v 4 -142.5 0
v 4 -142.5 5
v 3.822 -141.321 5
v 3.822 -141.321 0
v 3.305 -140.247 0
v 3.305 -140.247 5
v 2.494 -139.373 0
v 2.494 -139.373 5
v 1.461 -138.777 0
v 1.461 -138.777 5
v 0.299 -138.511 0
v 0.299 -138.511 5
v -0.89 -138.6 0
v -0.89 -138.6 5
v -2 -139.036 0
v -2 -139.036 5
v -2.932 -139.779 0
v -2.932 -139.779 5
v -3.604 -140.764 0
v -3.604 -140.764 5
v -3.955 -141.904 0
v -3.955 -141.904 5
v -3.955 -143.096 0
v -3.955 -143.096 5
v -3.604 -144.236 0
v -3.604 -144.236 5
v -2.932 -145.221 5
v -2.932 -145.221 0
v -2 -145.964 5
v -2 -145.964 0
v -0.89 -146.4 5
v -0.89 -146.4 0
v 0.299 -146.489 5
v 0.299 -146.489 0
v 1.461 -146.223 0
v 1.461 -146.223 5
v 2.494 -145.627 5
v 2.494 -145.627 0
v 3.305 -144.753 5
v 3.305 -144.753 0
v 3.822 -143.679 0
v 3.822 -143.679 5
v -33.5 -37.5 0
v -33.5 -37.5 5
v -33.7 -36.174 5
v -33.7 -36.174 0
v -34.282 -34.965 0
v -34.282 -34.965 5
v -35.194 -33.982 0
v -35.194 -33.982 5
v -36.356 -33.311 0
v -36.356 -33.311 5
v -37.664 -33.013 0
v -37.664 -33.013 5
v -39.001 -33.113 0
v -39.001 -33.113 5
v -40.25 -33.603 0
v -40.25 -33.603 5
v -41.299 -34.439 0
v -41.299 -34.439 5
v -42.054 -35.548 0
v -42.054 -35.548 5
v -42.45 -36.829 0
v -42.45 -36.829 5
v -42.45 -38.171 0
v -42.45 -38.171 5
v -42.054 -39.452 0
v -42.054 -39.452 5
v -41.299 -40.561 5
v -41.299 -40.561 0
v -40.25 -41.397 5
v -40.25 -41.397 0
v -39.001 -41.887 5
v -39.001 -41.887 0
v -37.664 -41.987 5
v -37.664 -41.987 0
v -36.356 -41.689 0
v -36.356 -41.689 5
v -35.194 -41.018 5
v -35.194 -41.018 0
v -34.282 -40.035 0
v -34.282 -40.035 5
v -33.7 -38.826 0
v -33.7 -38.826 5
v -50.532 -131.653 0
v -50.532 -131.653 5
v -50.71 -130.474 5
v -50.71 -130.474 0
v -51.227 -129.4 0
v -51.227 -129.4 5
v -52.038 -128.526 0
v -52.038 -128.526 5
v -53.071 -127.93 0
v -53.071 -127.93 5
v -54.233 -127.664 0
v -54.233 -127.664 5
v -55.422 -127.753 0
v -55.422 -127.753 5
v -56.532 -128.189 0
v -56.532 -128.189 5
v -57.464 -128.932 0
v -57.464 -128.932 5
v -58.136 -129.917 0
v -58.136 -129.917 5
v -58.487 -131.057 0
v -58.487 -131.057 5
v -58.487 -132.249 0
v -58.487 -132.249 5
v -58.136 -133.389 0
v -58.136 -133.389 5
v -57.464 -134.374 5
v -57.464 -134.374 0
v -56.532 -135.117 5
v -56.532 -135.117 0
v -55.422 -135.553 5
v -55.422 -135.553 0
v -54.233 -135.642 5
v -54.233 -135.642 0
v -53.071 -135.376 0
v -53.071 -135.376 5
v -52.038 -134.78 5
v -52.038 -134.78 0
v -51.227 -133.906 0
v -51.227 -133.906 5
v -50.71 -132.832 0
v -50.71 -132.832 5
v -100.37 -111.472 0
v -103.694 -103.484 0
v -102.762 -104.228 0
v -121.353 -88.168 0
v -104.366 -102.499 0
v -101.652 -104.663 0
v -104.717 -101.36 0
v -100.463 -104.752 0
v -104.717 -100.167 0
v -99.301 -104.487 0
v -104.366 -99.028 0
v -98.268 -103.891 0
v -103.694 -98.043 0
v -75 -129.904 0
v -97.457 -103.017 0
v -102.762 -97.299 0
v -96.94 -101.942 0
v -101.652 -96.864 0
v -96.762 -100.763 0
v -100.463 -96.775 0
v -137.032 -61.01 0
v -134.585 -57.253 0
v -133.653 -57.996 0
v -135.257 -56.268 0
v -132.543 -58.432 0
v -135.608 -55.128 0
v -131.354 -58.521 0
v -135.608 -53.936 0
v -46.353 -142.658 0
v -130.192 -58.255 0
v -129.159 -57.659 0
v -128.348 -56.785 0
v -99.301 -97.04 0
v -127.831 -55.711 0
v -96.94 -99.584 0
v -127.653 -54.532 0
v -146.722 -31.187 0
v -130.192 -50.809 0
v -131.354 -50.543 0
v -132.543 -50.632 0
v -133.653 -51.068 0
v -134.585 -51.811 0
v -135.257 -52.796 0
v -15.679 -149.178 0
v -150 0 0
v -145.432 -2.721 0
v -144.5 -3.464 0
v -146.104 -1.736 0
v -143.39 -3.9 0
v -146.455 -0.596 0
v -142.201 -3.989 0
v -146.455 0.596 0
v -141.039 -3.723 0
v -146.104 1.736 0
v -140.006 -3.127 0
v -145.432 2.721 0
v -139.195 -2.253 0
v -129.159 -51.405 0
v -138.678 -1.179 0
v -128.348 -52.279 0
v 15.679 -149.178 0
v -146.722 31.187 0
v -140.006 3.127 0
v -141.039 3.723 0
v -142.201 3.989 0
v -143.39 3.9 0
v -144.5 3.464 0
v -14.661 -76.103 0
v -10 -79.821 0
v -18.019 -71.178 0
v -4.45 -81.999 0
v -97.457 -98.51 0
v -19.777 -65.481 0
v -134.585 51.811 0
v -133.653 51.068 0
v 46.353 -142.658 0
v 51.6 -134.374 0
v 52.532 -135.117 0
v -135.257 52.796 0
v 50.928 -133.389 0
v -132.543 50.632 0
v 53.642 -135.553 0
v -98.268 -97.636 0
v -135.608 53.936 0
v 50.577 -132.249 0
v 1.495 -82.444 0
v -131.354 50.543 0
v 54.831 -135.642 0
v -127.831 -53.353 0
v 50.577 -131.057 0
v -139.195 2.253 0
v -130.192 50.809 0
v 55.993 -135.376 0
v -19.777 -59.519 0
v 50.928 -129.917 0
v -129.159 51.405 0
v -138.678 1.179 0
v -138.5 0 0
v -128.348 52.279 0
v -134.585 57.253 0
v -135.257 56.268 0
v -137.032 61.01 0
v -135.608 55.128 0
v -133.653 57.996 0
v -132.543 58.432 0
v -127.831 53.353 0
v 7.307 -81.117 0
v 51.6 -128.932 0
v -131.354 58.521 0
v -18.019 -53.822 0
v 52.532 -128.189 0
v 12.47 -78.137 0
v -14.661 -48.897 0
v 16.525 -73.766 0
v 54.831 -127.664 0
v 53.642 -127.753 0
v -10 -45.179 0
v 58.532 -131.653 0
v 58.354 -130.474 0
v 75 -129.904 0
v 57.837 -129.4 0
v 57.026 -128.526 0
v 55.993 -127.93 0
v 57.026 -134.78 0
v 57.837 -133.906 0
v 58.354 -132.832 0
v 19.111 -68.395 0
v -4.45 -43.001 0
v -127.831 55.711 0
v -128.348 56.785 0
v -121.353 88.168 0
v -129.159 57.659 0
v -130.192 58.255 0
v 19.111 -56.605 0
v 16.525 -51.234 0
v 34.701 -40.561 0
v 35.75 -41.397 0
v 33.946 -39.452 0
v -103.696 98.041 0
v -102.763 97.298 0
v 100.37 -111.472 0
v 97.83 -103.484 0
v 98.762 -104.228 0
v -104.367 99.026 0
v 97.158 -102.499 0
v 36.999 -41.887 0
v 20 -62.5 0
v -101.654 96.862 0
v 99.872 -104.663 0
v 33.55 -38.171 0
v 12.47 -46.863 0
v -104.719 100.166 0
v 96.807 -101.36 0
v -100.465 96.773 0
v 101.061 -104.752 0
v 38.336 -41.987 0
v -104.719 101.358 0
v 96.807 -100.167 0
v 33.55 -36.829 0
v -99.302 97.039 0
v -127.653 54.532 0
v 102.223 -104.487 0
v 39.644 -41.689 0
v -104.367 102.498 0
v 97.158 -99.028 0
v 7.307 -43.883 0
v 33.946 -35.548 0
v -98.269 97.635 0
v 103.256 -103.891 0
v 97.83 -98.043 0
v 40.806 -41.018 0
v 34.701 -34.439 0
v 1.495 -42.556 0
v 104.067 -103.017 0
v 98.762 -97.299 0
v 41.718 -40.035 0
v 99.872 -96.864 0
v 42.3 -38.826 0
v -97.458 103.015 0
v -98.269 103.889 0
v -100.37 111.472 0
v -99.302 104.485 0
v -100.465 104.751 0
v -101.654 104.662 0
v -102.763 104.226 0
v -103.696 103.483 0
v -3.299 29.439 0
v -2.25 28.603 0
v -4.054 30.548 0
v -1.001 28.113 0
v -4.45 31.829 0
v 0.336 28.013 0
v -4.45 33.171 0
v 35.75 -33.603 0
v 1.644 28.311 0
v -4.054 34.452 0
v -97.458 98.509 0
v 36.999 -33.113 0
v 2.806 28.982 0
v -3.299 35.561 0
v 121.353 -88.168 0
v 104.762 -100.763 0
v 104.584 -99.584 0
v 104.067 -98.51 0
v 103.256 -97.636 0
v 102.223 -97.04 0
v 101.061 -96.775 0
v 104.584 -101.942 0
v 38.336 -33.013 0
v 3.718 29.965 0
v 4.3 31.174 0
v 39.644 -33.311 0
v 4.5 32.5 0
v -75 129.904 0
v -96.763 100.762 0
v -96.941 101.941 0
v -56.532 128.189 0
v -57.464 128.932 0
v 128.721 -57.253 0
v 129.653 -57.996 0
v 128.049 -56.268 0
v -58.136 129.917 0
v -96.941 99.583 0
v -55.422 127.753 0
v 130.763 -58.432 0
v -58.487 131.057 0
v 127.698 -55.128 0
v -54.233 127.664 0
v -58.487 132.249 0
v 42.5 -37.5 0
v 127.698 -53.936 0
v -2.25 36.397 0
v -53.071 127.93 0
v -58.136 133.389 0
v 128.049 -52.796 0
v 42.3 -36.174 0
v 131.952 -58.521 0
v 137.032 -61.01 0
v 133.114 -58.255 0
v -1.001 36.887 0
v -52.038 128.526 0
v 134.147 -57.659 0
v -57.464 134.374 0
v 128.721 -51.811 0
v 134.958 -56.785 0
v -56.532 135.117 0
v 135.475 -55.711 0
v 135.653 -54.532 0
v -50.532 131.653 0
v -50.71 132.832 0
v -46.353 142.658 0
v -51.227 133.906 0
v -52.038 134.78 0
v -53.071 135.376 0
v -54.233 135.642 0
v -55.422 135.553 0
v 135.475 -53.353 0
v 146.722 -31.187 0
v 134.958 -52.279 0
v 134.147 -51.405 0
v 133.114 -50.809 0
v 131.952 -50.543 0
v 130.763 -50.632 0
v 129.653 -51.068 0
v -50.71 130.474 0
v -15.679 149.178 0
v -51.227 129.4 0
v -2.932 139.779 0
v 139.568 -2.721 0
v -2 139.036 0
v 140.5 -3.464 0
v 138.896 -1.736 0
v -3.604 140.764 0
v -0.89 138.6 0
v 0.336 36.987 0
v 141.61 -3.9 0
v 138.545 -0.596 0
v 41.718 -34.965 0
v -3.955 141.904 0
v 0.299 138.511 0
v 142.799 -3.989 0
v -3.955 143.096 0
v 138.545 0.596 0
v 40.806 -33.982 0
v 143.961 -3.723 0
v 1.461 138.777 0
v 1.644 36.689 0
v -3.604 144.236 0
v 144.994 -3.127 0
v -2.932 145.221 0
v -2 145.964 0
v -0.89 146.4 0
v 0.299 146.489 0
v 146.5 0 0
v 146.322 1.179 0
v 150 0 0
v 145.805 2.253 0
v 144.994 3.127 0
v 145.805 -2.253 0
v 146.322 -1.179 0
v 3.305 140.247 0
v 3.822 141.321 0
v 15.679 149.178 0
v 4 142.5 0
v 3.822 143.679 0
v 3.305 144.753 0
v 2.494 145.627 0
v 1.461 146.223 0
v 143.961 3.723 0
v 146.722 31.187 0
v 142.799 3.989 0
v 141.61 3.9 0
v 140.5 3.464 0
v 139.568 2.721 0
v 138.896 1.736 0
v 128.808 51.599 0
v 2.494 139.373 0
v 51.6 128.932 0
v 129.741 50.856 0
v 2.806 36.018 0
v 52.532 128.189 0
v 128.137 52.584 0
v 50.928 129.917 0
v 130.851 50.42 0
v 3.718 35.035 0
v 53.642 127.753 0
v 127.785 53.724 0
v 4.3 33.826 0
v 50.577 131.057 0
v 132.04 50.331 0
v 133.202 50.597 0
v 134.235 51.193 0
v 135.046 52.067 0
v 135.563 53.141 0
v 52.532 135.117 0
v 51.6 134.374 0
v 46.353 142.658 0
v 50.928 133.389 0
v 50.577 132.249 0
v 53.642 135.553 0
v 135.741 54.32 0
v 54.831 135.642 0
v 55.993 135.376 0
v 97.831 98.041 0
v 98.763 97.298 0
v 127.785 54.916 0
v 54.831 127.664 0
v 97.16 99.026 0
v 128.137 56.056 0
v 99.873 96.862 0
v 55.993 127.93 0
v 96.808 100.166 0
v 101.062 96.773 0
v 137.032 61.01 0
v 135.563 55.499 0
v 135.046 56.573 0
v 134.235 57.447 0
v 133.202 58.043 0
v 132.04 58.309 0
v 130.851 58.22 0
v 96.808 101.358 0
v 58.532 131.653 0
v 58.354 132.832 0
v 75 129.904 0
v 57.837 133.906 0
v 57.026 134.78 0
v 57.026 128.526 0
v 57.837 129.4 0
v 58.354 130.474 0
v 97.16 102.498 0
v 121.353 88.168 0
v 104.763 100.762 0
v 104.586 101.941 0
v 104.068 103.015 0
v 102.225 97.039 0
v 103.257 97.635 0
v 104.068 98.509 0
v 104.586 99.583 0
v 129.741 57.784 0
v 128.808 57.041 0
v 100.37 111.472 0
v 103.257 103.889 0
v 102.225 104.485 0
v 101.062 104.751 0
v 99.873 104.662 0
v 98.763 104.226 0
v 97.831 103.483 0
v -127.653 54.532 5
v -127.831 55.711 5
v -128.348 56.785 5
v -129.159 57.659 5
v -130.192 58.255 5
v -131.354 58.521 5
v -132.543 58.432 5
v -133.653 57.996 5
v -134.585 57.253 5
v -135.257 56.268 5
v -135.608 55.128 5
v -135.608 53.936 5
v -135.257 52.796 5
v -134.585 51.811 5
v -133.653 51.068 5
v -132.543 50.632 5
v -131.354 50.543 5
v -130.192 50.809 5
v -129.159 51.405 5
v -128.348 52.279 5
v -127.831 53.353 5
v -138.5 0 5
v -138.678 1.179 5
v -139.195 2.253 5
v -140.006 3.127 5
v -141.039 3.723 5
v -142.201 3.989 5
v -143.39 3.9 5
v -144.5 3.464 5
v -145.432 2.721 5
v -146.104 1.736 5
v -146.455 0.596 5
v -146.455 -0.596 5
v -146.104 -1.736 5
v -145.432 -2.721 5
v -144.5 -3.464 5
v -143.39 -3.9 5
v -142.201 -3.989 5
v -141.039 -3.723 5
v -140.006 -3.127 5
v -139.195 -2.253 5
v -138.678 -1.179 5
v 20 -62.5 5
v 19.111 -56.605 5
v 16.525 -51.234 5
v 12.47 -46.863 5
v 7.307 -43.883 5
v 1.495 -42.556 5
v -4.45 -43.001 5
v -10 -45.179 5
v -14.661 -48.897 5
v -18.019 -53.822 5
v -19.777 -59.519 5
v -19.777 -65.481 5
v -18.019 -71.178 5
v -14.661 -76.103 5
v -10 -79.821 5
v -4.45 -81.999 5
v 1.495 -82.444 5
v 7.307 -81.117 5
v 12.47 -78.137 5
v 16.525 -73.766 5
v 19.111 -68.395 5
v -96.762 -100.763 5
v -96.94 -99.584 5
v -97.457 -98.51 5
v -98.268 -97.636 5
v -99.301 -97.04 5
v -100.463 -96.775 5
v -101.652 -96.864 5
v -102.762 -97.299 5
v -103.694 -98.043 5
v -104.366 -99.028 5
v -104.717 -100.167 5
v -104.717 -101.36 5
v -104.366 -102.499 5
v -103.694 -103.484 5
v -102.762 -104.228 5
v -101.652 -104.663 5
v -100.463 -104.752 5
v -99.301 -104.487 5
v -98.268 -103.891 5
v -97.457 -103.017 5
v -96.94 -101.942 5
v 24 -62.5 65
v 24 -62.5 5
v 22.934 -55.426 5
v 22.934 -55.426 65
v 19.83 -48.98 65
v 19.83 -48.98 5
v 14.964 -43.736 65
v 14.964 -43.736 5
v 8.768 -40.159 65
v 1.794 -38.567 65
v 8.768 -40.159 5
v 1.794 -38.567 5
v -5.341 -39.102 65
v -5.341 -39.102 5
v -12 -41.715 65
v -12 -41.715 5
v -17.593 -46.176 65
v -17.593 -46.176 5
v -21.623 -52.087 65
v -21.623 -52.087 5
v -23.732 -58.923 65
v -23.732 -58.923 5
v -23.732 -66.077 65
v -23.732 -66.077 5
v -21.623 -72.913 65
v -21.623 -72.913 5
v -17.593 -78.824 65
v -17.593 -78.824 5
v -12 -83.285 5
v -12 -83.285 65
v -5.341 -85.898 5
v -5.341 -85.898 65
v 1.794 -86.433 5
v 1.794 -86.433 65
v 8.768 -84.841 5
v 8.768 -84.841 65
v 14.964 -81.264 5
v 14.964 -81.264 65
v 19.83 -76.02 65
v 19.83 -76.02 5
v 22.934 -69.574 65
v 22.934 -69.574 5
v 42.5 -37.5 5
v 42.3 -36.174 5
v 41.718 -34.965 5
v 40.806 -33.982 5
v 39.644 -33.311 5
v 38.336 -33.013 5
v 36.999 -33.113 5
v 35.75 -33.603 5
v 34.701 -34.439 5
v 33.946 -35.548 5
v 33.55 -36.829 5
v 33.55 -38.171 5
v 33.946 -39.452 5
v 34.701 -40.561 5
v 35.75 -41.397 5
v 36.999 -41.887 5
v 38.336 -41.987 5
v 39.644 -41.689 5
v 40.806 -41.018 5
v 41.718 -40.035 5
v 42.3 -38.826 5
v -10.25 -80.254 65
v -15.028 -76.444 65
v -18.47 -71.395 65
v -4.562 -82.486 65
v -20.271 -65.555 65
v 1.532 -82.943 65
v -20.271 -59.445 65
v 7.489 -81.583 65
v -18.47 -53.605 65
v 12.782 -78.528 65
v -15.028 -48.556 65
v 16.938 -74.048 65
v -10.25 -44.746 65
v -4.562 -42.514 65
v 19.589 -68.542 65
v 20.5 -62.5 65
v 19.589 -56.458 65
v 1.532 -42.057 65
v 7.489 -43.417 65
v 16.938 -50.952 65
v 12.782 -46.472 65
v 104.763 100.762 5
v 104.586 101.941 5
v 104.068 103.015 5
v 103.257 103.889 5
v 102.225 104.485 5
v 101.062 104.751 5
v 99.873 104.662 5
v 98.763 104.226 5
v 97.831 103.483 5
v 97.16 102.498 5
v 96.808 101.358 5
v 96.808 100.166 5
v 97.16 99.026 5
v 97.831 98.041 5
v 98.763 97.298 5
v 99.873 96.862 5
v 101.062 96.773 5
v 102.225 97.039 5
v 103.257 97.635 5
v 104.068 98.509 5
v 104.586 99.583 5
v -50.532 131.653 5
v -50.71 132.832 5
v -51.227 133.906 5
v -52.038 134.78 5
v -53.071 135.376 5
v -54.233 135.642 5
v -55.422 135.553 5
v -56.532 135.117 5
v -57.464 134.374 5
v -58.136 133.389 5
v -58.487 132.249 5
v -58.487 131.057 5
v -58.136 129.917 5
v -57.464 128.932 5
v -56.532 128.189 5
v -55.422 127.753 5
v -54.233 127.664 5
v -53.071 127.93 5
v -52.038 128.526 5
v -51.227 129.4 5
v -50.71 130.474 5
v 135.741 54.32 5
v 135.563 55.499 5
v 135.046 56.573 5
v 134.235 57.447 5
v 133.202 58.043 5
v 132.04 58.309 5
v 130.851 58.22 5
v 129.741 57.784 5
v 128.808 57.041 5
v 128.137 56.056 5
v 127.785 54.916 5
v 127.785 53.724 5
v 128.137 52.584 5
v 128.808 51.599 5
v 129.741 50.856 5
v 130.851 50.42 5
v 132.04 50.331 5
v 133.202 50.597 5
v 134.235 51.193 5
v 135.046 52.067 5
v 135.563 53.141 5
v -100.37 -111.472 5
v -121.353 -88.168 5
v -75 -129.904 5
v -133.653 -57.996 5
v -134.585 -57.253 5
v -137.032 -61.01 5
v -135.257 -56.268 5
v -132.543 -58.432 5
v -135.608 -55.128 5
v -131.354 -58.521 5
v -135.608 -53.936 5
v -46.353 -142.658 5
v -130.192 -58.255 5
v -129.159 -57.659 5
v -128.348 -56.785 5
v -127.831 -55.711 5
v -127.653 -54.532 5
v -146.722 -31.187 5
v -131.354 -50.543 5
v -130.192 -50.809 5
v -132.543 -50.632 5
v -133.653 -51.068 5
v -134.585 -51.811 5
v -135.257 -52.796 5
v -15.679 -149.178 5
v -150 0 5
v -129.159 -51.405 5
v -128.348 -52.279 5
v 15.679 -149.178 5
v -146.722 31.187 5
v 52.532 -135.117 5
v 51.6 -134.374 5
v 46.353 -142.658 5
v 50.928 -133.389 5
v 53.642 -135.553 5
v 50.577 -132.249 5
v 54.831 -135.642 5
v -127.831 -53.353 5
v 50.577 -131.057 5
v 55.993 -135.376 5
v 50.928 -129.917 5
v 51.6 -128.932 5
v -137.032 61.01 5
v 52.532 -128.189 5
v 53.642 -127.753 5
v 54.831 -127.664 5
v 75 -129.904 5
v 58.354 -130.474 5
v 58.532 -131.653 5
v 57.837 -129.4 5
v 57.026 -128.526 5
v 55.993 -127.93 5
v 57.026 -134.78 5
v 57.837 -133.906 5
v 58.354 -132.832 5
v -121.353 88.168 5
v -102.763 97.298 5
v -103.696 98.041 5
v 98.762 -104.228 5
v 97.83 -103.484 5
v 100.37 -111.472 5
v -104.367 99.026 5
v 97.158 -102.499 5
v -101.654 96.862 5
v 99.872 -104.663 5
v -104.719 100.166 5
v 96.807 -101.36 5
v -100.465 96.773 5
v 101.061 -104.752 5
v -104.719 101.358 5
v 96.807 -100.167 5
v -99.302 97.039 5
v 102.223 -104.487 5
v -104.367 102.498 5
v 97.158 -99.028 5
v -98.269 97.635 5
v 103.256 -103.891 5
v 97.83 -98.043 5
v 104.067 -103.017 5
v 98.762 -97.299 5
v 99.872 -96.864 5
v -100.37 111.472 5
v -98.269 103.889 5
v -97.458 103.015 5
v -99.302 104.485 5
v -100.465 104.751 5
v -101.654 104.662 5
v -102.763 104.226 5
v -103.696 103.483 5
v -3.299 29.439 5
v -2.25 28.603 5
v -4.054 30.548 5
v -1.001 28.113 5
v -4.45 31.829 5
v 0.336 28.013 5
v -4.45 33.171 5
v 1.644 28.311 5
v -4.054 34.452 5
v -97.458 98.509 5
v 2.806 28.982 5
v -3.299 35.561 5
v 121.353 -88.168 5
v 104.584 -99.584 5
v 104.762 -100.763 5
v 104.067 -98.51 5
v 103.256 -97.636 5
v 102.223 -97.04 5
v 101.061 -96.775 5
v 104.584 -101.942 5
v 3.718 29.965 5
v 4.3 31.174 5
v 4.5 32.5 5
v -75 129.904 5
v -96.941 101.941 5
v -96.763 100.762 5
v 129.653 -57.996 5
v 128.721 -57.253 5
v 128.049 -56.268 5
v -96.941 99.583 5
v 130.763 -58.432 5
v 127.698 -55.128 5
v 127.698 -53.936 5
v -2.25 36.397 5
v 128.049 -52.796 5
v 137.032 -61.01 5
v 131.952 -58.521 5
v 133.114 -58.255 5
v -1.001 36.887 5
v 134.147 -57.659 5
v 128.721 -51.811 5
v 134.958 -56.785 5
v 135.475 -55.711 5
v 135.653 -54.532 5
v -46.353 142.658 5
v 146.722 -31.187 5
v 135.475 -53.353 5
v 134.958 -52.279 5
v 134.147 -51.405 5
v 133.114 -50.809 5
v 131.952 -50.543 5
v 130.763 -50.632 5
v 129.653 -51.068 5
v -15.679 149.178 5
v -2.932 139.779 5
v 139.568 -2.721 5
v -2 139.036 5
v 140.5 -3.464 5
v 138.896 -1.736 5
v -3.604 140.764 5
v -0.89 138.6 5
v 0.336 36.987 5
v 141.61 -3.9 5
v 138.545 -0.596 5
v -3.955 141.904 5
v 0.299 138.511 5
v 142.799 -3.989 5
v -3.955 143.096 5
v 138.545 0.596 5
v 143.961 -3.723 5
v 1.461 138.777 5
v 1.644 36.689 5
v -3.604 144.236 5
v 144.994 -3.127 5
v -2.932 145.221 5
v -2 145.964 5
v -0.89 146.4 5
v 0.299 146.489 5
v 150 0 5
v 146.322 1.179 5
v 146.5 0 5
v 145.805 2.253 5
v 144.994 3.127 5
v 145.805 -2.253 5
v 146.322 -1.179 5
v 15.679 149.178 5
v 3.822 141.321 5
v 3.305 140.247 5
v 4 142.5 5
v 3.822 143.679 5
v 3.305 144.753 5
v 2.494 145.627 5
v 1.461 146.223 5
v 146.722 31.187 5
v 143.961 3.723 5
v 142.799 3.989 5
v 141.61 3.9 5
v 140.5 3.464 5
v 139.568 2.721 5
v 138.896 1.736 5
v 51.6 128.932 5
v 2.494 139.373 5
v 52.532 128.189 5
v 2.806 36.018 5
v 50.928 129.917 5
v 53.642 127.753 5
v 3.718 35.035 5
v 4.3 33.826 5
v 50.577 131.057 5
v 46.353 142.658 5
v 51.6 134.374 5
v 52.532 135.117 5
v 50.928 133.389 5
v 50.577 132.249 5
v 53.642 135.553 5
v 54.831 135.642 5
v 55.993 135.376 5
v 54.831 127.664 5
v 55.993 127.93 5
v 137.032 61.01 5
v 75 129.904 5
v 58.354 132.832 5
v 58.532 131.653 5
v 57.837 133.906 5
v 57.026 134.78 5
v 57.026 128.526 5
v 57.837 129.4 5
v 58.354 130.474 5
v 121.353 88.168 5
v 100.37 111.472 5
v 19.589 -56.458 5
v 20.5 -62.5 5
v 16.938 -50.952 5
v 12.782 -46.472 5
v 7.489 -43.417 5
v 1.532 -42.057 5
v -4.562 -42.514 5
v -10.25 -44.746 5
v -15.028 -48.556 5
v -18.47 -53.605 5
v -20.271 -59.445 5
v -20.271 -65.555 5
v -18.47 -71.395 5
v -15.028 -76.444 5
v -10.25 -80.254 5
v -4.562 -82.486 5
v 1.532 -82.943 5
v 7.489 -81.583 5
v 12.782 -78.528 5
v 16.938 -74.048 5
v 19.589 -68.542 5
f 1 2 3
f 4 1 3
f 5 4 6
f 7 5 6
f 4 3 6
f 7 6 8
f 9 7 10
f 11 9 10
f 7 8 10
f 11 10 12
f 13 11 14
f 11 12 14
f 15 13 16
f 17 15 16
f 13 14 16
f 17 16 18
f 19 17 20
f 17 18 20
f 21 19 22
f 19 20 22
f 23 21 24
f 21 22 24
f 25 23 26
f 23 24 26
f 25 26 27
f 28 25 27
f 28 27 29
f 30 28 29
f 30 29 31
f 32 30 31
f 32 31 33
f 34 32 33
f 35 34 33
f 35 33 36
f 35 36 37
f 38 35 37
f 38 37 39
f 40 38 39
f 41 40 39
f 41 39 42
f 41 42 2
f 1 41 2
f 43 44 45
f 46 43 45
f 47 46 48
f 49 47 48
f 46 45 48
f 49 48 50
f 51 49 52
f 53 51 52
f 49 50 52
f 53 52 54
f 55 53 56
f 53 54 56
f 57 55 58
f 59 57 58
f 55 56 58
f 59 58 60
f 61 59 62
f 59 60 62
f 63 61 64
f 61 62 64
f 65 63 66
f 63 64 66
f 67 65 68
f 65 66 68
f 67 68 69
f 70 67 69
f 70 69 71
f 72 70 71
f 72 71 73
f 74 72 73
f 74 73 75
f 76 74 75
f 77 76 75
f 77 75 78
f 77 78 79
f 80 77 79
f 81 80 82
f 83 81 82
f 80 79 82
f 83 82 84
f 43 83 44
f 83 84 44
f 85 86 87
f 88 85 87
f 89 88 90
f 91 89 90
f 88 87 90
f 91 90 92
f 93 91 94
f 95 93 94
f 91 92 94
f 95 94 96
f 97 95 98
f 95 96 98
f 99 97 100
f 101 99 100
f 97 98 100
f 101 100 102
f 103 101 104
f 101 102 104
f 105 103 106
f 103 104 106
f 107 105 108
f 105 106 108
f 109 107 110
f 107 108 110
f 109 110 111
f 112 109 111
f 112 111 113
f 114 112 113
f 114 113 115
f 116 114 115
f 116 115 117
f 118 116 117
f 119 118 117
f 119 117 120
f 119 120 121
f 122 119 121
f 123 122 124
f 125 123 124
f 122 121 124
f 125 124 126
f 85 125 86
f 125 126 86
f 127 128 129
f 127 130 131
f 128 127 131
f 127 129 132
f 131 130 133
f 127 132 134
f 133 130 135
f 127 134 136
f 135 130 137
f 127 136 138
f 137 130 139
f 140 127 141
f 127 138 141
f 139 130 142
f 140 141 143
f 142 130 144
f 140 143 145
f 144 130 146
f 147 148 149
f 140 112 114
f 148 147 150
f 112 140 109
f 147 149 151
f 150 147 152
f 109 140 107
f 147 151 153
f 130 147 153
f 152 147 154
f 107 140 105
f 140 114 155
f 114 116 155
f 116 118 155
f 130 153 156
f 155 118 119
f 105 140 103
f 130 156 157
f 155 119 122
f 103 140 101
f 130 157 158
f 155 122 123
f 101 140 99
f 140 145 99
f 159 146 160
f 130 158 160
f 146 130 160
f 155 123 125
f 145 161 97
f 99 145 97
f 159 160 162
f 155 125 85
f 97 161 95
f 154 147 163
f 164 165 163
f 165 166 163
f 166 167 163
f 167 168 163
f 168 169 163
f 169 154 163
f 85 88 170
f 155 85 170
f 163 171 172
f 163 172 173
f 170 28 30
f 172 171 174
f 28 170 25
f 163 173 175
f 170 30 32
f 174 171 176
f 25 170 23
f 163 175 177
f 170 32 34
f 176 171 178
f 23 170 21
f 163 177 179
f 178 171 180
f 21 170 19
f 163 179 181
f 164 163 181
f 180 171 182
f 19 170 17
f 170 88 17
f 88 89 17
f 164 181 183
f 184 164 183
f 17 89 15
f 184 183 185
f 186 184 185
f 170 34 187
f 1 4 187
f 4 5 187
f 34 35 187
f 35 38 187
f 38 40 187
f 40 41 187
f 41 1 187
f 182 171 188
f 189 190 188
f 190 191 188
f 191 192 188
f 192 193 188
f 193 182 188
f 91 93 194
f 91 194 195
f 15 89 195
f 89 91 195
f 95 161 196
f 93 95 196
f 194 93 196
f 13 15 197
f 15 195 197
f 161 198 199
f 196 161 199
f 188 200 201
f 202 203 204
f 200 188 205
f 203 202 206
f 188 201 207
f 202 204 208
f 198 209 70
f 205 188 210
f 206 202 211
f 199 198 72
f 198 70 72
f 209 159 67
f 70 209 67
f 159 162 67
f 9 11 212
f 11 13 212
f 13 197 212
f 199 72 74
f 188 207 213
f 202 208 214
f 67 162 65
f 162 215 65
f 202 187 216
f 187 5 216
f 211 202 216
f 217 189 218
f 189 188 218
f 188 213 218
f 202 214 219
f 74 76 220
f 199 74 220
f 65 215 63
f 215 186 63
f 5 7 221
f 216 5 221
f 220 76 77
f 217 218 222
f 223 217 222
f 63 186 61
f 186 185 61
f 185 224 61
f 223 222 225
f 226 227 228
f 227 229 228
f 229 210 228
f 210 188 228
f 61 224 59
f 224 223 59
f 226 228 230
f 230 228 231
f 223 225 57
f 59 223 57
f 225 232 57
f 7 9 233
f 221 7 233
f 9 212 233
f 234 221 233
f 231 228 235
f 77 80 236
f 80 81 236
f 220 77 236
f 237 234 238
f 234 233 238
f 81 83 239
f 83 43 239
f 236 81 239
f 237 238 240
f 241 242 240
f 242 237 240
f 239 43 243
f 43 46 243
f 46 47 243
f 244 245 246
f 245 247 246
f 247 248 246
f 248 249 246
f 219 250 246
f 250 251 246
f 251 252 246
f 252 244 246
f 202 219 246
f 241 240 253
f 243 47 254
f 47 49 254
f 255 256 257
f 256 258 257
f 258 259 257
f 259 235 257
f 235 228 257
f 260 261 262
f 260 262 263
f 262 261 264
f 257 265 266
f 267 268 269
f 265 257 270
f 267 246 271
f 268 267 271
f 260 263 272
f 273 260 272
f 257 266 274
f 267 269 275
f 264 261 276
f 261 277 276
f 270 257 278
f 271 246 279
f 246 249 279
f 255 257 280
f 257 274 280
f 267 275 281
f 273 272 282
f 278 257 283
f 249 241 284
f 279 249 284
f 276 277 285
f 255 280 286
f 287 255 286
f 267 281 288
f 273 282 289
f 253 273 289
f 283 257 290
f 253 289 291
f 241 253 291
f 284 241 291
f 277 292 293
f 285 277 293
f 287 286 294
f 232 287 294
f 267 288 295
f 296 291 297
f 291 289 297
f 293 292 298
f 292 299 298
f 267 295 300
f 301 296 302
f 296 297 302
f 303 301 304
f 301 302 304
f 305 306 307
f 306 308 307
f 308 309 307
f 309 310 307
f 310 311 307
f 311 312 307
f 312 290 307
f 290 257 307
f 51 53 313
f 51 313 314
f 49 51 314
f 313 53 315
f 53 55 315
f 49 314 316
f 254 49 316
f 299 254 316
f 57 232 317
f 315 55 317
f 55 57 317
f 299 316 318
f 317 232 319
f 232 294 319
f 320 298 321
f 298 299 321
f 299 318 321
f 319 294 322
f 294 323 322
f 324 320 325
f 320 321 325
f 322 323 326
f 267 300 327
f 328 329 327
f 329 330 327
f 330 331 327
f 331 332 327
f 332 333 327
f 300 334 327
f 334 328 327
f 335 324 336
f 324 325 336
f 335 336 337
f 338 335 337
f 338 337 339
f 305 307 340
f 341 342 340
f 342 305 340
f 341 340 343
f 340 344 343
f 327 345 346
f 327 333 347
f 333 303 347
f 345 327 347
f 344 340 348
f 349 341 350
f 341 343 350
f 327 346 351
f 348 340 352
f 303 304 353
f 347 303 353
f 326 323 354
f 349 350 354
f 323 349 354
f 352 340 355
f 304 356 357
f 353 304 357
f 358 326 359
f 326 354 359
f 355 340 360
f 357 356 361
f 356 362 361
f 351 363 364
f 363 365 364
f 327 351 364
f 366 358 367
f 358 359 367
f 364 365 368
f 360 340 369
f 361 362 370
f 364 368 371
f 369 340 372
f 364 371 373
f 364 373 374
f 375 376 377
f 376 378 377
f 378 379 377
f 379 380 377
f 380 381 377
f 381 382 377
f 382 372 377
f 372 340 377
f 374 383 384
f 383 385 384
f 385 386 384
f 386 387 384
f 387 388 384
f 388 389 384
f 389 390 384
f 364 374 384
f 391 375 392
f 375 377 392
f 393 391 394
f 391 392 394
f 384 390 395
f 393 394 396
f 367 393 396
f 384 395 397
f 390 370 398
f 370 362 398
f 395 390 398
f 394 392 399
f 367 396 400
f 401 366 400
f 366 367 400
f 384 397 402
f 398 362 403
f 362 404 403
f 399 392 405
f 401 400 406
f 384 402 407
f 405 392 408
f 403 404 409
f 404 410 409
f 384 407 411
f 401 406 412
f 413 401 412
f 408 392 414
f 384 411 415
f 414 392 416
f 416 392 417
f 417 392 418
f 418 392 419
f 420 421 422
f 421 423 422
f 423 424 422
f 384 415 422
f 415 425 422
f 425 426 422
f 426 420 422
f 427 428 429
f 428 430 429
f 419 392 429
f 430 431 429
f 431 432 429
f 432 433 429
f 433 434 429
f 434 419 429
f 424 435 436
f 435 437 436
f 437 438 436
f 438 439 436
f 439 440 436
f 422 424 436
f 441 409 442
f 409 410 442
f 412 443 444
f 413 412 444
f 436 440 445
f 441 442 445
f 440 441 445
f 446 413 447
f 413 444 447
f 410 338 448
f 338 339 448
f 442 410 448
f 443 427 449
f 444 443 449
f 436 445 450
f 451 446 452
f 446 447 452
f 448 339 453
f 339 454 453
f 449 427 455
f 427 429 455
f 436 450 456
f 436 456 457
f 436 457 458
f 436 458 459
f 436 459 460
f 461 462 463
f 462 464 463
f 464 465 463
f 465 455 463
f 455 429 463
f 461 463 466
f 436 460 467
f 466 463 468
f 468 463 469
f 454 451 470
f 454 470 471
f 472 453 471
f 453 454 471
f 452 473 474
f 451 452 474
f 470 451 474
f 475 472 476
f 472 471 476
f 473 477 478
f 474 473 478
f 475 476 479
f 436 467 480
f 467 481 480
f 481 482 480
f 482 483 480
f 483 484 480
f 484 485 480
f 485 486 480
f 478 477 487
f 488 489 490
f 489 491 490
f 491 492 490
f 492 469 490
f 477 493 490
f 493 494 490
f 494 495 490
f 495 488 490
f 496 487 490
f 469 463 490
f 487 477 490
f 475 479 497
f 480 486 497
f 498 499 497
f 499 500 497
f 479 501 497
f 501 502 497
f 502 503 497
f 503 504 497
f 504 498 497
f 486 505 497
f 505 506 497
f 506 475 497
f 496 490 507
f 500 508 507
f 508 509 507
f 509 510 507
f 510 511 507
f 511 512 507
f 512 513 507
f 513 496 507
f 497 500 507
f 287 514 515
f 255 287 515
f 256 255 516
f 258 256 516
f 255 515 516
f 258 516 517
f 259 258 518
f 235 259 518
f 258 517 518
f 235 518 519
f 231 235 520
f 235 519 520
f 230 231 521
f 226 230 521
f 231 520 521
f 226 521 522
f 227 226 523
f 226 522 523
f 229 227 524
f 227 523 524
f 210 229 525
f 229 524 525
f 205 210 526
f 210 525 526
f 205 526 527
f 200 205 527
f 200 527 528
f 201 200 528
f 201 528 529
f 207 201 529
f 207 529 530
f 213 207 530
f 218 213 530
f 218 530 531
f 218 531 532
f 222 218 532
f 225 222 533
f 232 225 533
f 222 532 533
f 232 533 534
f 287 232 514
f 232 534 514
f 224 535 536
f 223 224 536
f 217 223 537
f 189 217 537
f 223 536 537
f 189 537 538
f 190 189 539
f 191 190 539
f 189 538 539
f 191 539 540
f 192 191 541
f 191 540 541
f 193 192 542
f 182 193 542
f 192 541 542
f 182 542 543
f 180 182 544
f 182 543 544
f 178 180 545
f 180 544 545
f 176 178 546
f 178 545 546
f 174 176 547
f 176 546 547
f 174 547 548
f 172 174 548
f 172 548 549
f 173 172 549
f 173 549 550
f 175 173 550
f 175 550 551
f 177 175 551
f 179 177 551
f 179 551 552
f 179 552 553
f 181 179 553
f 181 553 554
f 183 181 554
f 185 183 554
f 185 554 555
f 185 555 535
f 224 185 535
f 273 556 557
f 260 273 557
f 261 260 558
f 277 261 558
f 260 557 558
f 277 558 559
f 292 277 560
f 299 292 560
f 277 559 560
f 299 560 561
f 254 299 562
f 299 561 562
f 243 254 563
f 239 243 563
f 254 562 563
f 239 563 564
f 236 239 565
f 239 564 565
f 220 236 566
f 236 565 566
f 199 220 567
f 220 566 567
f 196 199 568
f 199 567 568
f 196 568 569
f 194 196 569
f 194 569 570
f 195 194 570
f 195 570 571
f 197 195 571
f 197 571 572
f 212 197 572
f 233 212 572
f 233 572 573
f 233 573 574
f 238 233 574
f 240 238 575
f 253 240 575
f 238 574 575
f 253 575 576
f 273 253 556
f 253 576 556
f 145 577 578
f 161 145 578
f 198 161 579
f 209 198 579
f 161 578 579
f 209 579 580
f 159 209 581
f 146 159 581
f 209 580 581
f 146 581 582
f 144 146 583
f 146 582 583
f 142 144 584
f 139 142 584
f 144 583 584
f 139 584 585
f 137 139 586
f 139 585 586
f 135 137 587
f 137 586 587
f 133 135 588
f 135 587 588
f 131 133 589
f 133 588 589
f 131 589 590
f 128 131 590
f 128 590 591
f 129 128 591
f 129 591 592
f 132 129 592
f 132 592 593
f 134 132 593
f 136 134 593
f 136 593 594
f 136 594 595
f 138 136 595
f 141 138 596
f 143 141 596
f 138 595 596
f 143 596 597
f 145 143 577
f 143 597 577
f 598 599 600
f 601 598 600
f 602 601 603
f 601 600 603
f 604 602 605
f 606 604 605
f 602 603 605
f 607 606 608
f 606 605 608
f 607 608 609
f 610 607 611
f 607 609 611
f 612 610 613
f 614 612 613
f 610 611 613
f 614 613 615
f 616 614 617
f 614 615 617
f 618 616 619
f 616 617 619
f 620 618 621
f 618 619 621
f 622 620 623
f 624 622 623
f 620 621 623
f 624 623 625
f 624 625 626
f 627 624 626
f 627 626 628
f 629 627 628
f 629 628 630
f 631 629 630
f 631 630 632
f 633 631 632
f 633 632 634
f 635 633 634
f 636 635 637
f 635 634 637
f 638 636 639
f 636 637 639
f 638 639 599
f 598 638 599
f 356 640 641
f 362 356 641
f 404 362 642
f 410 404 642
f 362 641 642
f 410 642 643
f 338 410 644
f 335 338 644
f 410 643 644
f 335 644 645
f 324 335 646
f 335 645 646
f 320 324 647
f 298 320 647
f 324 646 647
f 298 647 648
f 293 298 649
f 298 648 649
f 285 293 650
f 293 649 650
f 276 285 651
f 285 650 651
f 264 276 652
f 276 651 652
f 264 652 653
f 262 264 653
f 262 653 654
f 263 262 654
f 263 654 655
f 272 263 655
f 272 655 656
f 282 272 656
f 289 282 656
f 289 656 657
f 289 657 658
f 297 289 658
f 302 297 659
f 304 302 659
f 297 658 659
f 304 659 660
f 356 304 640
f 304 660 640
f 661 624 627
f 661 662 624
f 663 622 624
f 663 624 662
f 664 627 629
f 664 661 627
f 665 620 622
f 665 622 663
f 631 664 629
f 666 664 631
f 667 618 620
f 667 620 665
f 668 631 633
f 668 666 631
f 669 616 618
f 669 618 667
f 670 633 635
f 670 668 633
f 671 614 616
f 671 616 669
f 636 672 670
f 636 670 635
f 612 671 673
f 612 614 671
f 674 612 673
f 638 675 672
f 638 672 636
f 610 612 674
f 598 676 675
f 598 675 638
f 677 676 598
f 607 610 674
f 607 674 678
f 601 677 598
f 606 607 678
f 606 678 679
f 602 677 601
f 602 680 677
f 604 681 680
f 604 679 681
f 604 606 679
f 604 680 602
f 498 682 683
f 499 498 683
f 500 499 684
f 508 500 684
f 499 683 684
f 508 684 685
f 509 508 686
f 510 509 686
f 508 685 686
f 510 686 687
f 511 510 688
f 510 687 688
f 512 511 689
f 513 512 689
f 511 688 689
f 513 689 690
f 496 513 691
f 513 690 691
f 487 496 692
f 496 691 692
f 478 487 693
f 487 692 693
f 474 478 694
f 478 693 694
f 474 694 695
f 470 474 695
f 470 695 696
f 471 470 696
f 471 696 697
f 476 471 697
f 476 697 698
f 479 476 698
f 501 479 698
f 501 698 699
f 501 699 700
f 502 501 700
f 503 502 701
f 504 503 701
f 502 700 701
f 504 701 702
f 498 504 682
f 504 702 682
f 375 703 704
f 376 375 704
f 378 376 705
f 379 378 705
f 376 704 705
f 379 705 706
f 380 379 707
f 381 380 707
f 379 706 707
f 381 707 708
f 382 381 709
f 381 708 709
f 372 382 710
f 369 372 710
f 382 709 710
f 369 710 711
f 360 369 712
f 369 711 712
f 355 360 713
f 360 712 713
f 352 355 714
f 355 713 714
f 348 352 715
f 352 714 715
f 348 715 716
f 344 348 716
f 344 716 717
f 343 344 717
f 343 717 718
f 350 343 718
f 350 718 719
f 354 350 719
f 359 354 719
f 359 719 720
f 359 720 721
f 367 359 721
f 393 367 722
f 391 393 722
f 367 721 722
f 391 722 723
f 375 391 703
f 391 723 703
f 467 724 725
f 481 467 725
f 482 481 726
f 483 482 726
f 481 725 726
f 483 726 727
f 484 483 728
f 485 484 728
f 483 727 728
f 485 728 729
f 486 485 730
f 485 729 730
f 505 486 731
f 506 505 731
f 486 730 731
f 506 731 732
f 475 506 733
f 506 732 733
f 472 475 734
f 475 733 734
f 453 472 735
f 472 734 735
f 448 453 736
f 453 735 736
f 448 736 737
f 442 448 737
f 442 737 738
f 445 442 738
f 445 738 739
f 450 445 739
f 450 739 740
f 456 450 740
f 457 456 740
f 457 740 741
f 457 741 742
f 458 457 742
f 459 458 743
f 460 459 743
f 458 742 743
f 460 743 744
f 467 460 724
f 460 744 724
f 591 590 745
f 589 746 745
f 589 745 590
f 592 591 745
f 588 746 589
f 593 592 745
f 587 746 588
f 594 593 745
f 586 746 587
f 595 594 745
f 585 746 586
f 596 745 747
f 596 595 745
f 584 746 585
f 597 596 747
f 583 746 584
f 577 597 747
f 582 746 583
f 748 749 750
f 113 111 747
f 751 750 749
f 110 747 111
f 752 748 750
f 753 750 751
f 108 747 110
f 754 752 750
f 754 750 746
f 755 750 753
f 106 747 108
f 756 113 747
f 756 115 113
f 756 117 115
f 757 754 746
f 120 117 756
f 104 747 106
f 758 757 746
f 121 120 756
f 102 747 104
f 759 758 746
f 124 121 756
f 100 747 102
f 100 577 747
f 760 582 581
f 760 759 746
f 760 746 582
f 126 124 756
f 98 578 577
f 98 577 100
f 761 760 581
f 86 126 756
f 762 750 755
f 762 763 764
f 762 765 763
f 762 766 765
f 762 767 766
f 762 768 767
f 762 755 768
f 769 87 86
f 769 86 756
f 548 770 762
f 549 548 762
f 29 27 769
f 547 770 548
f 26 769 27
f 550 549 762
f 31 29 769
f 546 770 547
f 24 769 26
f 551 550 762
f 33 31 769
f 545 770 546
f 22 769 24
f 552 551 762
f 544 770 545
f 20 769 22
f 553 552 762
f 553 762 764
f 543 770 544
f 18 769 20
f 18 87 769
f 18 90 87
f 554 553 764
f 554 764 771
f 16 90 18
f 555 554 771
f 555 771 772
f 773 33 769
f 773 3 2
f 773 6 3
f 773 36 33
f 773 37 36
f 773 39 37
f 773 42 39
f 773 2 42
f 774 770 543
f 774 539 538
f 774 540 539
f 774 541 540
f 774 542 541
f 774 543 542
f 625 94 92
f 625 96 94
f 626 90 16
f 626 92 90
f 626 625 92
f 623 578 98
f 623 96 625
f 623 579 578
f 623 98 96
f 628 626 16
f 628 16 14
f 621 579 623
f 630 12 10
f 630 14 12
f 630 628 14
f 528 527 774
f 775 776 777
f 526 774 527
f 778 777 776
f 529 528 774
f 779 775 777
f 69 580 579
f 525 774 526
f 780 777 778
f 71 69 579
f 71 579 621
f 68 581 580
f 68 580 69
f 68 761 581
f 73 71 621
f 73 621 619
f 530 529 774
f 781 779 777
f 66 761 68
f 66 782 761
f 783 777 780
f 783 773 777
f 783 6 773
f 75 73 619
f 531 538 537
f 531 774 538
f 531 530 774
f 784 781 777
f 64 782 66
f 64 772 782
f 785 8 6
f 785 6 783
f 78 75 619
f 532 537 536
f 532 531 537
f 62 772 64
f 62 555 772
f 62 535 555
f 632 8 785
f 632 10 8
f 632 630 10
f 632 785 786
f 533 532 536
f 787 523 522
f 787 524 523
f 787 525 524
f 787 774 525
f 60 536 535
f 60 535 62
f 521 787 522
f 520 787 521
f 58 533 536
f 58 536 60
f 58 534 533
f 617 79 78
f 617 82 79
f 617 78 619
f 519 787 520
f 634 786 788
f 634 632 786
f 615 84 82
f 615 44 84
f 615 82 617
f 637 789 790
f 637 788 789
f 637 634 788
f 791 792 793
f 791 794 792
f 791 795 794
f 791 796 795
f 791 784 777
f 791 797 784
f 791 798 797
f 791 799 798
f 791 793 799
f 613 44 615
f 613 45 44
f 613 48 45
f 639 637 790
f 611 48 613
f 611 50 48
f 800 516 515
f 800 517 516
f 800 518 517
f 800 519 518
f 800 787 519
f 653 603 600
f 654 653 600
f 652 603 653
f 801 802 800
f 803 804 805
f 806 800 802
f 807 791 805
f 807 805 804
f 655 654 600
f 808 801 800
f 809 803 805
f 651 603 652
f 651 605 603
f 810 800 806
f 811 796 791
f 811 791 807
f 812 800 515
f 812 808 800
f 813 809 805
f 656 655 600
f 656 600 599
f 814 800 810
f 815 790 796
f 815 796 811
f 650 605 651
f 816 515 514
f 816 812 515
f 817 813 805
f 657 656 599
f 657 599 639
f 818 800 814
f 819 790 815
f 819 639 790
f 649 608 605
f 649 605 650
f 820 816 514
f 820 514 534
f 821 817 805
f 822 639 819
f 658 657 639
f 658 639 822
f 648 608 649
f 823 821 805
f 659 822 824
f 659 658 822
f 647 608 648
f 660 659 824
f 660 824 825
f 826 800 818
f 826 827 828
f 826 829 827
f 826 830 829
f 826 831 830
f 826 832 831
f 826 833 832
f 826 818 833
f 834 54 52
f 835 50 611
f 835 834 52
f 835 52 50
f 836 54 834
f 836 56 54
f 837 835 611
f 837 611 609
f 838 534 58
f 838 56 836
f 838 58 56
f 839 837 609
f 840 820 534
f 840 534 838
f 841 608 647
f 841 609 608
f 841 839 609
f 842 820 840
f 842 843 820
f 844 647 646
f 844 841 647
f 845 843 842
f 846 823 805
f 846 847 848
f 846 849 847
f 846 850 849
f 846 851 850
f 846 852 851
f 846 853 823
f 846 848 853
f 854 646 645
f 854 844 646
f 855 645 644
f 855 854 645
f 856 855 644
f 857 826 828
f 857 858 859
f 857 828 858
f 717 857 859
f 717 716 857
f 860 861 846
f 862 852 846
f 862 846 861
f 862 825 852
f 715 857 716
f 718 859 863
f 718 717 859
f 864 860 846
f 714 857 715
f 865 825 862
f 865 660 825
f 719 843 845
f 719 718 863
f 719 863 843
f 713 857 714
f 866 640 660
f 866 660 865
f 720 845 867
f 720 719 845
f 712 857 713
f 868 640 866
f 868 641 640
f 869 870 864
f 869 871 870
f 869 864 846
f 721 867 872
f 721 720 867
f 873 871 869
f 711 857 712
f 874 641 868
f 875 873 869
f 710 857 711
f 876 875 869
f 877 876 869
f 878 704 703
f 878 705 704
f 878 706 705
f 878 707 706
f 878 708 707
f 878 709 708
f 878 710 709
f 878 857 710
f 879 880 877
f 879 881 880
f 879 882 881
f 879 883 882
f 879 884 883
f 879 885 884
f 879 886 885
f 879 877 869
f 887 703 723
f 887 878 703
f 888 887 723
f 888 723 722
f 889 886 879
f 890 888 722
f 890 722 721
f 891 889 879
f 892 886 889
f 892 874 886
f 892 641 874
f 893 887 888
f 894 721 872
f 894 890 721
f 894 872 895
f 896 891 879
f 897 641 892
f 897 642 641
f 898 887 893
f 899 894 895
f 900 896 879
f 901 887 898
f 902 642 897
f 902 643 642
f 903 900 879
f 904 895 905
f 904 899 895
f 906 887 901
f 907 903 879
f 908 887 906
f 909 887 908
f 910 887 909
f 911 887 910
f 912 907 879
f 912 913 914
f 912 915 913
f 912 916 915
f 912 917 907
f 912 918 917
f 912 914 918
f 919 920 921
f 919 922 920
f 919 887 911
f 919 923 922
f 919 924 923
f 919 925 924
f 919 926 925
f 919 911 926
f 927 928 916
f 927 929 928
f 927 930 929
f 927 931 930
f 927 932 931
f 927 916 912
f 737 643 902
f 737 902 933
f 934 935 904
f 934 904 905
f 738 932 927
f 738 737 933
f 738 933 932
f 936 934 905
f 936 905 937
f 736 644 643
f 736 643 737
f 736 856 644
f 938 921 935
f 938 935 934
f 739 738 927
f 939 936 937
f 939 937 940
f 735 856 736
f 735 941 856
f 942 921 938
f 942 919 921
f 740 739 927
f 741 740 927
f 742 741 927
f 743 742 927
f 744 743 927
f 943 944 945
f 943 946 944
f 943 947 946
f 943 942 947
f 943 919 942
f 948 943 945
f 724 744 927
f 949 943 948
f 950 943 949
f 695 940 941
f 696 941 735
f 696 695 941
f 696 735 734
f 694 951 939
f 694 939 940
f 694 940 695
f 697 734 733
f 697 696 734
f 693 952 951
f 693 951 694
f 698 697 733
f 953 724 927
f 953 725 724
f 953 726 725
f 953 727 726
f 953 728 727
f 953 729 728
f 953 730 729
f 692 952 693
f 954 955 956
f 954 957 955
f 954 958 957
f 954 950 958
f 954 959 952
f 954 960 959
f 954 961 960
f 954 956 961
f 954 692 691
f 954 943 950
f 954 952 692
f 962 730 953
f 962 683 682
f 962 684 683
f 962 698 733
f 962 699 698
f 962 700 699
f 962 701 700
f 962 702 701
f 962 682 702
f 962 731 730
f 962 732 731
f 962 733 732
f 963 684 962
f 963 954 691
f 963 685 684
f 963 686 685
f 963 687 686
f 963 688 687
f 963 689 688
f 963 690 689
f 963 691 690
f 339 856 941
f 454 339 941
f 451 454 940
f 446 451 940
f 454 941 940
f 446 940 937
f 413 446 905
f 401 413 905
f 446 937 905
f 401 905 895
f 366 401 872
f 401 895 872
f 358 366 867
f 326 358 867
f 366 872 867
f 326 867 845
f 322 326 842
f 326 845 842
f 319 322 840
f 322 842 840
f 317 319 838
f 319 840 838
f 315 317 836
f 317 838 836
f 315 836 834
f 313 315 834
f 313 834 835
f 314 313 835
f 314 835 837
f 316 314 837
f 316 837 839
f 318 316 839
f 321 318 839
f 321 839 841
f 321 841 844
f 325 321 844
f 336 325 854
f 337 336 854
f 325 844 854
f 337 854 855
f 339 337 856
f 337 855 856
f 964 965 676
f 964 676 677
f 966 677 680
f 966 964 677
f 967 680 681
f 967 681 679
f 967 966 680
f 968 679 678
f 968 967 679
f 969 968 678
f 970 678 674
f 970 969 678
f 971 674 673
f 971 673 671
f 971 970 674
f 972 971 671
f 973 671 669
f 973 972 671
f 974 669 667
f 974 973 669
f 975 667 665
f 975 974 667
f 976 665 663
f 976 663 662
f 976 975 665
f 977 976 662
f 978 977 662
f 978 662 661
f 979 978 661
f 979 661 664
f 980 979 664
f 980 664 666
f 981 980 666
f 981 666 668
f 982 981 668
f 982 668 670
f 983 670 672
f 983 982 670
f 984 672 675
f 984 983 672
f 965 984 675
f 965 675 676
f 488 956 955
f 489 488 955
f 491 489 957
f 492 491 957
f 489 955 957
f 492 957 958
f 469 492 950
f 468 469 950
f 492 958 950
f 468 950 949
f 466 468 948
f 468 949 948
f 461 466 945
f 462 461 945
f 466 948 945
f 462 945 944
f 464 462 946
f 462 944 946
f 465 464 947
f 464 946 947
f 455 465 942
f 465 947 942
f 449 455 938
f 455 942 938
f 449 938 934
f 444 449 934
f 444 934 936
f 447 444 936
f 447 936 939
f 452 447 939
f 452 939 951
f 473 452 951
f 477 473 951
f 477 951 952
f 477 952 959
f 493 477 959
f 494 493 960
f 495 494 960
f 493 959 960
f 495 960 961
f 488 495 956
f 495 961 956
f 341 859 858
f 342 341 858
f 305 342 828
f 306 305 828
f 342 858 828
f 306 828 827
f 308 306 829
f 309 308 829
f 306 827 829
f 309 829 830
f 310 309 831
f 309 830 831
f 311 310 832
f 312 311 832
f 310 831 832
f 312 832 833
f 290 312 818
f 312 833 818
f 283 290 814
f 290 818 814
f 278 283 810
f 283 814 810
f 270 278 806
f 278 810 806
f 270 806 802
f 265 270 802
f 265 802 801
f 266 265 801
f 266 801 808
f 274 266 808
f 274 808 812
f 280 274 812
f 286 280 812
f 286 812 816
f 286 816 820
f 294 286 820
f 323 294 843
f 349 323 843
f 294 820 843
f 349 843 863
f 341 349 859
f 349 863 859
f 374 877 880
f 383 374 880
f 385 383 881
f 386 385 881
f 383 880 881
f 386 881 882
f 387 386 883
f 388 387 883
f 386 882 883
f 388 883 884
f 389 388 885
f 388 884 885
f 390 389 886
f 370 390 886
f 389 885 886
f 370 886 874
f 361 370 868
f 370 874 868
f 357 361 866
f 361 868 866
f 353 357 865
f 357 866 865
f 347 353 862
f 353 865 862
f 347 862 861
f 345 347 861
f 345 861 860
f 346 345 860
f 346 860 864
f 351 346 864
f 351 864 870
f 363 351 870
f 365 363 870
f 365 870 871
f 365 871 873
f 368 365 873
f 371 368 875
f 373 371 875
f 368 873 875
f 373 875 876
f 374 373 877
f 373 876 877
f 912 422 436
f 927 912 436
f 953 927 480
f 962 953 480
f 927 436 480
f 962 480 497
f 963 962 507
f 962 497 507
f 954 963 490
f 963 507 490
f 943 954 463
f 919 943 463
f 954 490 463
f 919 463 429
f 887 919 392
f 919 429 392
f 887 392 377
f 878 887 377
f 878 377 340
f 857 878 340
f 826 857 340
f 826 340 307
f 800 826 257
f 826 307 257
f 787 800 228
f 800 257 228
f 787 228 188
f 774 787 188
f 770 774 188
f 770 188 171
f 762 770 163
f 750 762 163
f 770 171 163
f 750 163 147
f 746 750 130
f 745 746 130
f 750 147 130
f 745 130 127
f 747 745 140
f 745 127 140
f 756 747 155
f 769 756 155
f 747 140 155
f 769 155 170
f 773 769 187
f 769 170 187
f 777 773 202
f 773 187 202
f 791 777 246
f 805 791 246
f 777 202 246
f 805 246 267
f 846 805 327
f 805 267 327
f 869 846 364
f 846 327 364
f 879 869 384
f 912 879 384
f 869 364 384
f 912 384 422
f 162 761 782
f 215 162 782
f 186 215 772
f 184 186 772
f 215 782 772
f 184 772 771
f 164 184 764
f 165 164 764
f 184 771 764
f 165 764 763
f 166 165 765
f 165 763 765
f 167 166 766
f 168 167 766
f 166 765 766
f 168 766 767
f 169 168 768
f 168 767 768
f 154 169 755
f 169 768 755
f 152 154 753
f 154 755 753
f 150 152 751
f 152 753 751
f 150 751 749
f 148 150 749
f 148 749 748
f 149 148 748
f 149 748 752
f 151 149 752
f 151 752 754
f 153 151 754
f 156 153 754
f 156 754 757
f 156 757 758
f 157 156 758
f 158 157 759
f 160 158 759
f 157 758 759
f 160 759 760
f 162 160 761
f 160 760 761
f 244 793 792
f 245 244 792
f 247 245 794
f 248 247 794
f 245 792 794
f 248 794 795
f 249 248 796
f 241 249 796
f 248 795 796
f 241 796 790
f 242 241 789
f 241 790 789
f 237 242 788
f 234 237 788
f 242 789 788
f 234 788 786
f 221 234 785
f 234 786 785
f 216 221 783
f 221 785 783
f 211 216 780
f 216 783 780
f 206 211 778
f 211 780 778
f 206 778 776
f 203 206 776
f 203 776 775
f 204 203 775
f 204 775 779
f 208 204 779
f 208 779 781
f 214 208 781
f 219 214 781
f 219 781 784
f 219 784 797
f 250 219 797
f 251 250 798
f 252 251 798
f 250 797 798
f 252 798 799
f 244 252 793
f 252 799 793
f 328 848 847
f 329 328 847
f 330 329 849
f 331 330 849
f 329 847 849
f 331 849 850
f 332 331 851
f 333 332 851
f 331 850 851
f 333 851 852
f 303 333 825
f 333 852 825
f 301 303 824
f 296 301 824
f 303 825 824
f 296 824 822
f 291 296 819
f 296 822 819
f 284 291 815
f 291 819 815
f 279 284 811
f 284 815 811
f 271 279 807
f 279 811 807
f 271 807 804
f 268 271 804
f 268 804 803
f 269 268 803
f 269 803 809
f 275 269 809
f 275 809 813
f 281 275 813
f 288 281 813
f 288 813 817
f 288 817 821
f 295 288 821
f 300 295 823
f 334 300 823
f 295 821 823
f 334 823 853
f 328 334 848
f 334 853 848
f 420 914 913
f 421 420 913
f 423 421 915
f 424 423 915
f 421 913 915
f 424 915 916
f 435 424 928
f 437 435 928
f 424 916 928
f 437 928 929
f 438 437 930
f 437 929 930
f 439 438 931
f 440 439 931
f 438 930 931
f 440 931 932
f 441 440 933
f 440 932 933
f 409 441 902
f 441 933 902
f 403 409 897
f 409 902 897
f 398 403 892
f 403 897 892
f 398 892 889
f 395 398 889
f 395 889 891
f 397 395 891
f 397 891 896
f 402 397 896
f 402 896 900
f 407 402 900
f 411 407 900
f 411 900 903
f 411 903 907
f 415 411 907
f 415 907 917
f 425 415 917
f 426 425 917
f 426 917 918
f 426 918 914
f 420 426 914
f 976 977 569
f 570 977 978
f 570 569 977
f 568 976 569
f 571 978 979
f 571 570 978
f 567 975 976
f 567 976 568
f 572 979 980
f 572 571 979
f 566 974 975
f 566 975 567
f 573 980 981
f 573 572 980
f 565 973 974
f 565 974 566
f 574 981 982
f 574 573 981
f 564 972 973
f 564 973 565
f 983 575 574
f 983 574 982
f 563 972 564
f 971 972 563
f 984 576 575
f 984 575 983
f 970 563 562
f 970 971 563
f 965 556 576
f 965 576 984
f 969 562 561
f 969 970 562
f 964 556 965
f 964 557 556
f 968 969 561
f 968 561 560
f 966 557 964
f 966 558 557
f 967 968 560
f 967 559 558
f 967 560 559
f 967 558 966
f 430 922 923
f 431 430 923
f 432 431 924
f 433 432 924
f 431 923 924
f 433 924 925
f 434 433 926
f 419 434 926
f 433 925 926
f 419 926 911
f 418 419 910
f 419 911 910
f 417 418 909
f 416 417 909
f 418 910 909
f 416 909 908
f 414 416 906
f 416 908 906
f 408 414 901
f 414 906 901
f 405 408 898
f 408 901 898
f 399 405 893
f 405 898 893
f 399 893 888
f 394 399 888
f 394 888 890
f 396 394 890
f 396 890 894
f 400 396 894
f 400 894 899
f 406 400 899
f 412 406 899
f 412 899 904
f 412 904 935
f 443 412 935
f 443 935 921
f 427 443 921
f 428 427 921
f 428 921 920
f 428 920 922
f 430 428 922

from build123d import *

# Parameters (mm, degrees)
SKETCH_R        = 150
PAD_DEPTH       = 5
SKETCH001_R     = 4
POCKET_DEPTH    = 5.001
SKETCH003_R     = 20
SKETCH003_R_2   = 4.5
POCKET001_DEPTH = 5
POCKET002_DEPTH = 5
SKETCH004_R     = 4
POCKET003_DEPTH = 5
SKETCH005_R     = 24
SKETCH005_R_2   = 20.5
PAD001_DEPTH    = 60


with BuildPart() as part:
    # Sketch → Pad (new body)
    with BuildSketch(Plane.XY):
        Circle(SKETCH_R)
    extrude(amount=PAD_DEPTH)

    # Sketch001 (on Face3 of Pad) → Pocket (cut, through all)
    with BuildSketch(Plane.XY.offset(5)):
        with Locations((0, 142.5)):
            Circle(SKETCH001_R)
        with Locations((-142.5, 0)):
            Circle(SKETCH001_R)
        with Locations((0, -142.5)):
            Circle(SKETCH001_R)
        with Locations((142.5, 0)):
            Circle(SKETCH001_R)
    extrude(amount=-POCKET_DEPTH, mode=Mode.SUBTRACT)

    # Sketch003 (on Face3 of Pocket) → Pocket001 (cut)
    with BuildSketch(Plane.XY.offset(5)):
        with Locations((0, -62.5)):
            Circle(SKETCH003_R)
        with Locations((0, 32.5)):
            Circle(SKETCH003_R_2)
        with Locations((-38, -37.5)):
            Circle(SKETCH003_R_2)
        with Locations((38, -37.5)):
            Circle(SKETCH003_R_2)
    extrude(amount=-POCKET001_DEPTH, mode=Mode.SUBTRACT)

    # Sketch003 (on Face3 of Pocket) → Pocket002 (cut)
    with BuildSketch(Plane.XY.offset(5)):
        with Locations((0, -62.5)):
            Circle(SKETCH003_R)
        with Locations((0, 32.5)):
            Circle(SKETCH003_R_2)
        with Locations((-38, -37.5)):
            Circle(SKETCH003_R_2)
        with Locations((38, -37.5)):
            Circle(SKETCH003_R_2)
    extrude(amount=-POCKET002_DEPTH, mode=Mode.SUBTRACT)

    # Sketch004 (on Face3 of Pocket002) → Pocket003 (cut)
    with BuildSketch(Plane.XY.offset(5)):
        with Locations((100.763433, 100.762)):
            Circle(SKETCH004_R)
        with Locations((100.762, -100.763433)):
            Circle(SKETCH004_R)
        with Locations((-54.532, -131.652995)):
            Circle(SKETCH004_R)
        with Locations((-100.763433, 100.762)):
            Circle(SKETCH004_R)
        with Locations((-100.762, -100.763433)):
            Circle(SKETCH004_R)
        with Locations((-131.652995, -54.532)):
            Circle(SKETCH004_R)
        with Locations((-131.652995, 54.532)):
            Circle(SKETCH004_R)
        with Locations((-54.532, 131.652995)):
            Circle(SKETCH004_R)
        with Locations((54.532, 131.652995)):
            Circle(SKETCH004_R)
        with Locations((131.740607, 54.32)):
            Circle(SKETCH004_R)
        with Locations((54.532, -131.652995)):
            Circle(SKETCH004_R)
        with Locations((131.652995, -54.532)):
            Circle(SKETCH004_R)
    extrude(amount=-POCKET003_DEPTH, mode=Mode.SUBTRACT)

    # Sketch005 (on Face3 of Pocket003) → Pad001 (join)
    with BuildSketch(Plane.XY.offset(5)):
        with Locations((0, -62.5)):
            Circle(SKETCH005_R)
        with Locations((0, -62.5)):
            Circle(SKETCH005_R_2, mode=Mode.SUBTRACT)
    extrude(amount=PAD001_DEPTH)


solid = part.part
